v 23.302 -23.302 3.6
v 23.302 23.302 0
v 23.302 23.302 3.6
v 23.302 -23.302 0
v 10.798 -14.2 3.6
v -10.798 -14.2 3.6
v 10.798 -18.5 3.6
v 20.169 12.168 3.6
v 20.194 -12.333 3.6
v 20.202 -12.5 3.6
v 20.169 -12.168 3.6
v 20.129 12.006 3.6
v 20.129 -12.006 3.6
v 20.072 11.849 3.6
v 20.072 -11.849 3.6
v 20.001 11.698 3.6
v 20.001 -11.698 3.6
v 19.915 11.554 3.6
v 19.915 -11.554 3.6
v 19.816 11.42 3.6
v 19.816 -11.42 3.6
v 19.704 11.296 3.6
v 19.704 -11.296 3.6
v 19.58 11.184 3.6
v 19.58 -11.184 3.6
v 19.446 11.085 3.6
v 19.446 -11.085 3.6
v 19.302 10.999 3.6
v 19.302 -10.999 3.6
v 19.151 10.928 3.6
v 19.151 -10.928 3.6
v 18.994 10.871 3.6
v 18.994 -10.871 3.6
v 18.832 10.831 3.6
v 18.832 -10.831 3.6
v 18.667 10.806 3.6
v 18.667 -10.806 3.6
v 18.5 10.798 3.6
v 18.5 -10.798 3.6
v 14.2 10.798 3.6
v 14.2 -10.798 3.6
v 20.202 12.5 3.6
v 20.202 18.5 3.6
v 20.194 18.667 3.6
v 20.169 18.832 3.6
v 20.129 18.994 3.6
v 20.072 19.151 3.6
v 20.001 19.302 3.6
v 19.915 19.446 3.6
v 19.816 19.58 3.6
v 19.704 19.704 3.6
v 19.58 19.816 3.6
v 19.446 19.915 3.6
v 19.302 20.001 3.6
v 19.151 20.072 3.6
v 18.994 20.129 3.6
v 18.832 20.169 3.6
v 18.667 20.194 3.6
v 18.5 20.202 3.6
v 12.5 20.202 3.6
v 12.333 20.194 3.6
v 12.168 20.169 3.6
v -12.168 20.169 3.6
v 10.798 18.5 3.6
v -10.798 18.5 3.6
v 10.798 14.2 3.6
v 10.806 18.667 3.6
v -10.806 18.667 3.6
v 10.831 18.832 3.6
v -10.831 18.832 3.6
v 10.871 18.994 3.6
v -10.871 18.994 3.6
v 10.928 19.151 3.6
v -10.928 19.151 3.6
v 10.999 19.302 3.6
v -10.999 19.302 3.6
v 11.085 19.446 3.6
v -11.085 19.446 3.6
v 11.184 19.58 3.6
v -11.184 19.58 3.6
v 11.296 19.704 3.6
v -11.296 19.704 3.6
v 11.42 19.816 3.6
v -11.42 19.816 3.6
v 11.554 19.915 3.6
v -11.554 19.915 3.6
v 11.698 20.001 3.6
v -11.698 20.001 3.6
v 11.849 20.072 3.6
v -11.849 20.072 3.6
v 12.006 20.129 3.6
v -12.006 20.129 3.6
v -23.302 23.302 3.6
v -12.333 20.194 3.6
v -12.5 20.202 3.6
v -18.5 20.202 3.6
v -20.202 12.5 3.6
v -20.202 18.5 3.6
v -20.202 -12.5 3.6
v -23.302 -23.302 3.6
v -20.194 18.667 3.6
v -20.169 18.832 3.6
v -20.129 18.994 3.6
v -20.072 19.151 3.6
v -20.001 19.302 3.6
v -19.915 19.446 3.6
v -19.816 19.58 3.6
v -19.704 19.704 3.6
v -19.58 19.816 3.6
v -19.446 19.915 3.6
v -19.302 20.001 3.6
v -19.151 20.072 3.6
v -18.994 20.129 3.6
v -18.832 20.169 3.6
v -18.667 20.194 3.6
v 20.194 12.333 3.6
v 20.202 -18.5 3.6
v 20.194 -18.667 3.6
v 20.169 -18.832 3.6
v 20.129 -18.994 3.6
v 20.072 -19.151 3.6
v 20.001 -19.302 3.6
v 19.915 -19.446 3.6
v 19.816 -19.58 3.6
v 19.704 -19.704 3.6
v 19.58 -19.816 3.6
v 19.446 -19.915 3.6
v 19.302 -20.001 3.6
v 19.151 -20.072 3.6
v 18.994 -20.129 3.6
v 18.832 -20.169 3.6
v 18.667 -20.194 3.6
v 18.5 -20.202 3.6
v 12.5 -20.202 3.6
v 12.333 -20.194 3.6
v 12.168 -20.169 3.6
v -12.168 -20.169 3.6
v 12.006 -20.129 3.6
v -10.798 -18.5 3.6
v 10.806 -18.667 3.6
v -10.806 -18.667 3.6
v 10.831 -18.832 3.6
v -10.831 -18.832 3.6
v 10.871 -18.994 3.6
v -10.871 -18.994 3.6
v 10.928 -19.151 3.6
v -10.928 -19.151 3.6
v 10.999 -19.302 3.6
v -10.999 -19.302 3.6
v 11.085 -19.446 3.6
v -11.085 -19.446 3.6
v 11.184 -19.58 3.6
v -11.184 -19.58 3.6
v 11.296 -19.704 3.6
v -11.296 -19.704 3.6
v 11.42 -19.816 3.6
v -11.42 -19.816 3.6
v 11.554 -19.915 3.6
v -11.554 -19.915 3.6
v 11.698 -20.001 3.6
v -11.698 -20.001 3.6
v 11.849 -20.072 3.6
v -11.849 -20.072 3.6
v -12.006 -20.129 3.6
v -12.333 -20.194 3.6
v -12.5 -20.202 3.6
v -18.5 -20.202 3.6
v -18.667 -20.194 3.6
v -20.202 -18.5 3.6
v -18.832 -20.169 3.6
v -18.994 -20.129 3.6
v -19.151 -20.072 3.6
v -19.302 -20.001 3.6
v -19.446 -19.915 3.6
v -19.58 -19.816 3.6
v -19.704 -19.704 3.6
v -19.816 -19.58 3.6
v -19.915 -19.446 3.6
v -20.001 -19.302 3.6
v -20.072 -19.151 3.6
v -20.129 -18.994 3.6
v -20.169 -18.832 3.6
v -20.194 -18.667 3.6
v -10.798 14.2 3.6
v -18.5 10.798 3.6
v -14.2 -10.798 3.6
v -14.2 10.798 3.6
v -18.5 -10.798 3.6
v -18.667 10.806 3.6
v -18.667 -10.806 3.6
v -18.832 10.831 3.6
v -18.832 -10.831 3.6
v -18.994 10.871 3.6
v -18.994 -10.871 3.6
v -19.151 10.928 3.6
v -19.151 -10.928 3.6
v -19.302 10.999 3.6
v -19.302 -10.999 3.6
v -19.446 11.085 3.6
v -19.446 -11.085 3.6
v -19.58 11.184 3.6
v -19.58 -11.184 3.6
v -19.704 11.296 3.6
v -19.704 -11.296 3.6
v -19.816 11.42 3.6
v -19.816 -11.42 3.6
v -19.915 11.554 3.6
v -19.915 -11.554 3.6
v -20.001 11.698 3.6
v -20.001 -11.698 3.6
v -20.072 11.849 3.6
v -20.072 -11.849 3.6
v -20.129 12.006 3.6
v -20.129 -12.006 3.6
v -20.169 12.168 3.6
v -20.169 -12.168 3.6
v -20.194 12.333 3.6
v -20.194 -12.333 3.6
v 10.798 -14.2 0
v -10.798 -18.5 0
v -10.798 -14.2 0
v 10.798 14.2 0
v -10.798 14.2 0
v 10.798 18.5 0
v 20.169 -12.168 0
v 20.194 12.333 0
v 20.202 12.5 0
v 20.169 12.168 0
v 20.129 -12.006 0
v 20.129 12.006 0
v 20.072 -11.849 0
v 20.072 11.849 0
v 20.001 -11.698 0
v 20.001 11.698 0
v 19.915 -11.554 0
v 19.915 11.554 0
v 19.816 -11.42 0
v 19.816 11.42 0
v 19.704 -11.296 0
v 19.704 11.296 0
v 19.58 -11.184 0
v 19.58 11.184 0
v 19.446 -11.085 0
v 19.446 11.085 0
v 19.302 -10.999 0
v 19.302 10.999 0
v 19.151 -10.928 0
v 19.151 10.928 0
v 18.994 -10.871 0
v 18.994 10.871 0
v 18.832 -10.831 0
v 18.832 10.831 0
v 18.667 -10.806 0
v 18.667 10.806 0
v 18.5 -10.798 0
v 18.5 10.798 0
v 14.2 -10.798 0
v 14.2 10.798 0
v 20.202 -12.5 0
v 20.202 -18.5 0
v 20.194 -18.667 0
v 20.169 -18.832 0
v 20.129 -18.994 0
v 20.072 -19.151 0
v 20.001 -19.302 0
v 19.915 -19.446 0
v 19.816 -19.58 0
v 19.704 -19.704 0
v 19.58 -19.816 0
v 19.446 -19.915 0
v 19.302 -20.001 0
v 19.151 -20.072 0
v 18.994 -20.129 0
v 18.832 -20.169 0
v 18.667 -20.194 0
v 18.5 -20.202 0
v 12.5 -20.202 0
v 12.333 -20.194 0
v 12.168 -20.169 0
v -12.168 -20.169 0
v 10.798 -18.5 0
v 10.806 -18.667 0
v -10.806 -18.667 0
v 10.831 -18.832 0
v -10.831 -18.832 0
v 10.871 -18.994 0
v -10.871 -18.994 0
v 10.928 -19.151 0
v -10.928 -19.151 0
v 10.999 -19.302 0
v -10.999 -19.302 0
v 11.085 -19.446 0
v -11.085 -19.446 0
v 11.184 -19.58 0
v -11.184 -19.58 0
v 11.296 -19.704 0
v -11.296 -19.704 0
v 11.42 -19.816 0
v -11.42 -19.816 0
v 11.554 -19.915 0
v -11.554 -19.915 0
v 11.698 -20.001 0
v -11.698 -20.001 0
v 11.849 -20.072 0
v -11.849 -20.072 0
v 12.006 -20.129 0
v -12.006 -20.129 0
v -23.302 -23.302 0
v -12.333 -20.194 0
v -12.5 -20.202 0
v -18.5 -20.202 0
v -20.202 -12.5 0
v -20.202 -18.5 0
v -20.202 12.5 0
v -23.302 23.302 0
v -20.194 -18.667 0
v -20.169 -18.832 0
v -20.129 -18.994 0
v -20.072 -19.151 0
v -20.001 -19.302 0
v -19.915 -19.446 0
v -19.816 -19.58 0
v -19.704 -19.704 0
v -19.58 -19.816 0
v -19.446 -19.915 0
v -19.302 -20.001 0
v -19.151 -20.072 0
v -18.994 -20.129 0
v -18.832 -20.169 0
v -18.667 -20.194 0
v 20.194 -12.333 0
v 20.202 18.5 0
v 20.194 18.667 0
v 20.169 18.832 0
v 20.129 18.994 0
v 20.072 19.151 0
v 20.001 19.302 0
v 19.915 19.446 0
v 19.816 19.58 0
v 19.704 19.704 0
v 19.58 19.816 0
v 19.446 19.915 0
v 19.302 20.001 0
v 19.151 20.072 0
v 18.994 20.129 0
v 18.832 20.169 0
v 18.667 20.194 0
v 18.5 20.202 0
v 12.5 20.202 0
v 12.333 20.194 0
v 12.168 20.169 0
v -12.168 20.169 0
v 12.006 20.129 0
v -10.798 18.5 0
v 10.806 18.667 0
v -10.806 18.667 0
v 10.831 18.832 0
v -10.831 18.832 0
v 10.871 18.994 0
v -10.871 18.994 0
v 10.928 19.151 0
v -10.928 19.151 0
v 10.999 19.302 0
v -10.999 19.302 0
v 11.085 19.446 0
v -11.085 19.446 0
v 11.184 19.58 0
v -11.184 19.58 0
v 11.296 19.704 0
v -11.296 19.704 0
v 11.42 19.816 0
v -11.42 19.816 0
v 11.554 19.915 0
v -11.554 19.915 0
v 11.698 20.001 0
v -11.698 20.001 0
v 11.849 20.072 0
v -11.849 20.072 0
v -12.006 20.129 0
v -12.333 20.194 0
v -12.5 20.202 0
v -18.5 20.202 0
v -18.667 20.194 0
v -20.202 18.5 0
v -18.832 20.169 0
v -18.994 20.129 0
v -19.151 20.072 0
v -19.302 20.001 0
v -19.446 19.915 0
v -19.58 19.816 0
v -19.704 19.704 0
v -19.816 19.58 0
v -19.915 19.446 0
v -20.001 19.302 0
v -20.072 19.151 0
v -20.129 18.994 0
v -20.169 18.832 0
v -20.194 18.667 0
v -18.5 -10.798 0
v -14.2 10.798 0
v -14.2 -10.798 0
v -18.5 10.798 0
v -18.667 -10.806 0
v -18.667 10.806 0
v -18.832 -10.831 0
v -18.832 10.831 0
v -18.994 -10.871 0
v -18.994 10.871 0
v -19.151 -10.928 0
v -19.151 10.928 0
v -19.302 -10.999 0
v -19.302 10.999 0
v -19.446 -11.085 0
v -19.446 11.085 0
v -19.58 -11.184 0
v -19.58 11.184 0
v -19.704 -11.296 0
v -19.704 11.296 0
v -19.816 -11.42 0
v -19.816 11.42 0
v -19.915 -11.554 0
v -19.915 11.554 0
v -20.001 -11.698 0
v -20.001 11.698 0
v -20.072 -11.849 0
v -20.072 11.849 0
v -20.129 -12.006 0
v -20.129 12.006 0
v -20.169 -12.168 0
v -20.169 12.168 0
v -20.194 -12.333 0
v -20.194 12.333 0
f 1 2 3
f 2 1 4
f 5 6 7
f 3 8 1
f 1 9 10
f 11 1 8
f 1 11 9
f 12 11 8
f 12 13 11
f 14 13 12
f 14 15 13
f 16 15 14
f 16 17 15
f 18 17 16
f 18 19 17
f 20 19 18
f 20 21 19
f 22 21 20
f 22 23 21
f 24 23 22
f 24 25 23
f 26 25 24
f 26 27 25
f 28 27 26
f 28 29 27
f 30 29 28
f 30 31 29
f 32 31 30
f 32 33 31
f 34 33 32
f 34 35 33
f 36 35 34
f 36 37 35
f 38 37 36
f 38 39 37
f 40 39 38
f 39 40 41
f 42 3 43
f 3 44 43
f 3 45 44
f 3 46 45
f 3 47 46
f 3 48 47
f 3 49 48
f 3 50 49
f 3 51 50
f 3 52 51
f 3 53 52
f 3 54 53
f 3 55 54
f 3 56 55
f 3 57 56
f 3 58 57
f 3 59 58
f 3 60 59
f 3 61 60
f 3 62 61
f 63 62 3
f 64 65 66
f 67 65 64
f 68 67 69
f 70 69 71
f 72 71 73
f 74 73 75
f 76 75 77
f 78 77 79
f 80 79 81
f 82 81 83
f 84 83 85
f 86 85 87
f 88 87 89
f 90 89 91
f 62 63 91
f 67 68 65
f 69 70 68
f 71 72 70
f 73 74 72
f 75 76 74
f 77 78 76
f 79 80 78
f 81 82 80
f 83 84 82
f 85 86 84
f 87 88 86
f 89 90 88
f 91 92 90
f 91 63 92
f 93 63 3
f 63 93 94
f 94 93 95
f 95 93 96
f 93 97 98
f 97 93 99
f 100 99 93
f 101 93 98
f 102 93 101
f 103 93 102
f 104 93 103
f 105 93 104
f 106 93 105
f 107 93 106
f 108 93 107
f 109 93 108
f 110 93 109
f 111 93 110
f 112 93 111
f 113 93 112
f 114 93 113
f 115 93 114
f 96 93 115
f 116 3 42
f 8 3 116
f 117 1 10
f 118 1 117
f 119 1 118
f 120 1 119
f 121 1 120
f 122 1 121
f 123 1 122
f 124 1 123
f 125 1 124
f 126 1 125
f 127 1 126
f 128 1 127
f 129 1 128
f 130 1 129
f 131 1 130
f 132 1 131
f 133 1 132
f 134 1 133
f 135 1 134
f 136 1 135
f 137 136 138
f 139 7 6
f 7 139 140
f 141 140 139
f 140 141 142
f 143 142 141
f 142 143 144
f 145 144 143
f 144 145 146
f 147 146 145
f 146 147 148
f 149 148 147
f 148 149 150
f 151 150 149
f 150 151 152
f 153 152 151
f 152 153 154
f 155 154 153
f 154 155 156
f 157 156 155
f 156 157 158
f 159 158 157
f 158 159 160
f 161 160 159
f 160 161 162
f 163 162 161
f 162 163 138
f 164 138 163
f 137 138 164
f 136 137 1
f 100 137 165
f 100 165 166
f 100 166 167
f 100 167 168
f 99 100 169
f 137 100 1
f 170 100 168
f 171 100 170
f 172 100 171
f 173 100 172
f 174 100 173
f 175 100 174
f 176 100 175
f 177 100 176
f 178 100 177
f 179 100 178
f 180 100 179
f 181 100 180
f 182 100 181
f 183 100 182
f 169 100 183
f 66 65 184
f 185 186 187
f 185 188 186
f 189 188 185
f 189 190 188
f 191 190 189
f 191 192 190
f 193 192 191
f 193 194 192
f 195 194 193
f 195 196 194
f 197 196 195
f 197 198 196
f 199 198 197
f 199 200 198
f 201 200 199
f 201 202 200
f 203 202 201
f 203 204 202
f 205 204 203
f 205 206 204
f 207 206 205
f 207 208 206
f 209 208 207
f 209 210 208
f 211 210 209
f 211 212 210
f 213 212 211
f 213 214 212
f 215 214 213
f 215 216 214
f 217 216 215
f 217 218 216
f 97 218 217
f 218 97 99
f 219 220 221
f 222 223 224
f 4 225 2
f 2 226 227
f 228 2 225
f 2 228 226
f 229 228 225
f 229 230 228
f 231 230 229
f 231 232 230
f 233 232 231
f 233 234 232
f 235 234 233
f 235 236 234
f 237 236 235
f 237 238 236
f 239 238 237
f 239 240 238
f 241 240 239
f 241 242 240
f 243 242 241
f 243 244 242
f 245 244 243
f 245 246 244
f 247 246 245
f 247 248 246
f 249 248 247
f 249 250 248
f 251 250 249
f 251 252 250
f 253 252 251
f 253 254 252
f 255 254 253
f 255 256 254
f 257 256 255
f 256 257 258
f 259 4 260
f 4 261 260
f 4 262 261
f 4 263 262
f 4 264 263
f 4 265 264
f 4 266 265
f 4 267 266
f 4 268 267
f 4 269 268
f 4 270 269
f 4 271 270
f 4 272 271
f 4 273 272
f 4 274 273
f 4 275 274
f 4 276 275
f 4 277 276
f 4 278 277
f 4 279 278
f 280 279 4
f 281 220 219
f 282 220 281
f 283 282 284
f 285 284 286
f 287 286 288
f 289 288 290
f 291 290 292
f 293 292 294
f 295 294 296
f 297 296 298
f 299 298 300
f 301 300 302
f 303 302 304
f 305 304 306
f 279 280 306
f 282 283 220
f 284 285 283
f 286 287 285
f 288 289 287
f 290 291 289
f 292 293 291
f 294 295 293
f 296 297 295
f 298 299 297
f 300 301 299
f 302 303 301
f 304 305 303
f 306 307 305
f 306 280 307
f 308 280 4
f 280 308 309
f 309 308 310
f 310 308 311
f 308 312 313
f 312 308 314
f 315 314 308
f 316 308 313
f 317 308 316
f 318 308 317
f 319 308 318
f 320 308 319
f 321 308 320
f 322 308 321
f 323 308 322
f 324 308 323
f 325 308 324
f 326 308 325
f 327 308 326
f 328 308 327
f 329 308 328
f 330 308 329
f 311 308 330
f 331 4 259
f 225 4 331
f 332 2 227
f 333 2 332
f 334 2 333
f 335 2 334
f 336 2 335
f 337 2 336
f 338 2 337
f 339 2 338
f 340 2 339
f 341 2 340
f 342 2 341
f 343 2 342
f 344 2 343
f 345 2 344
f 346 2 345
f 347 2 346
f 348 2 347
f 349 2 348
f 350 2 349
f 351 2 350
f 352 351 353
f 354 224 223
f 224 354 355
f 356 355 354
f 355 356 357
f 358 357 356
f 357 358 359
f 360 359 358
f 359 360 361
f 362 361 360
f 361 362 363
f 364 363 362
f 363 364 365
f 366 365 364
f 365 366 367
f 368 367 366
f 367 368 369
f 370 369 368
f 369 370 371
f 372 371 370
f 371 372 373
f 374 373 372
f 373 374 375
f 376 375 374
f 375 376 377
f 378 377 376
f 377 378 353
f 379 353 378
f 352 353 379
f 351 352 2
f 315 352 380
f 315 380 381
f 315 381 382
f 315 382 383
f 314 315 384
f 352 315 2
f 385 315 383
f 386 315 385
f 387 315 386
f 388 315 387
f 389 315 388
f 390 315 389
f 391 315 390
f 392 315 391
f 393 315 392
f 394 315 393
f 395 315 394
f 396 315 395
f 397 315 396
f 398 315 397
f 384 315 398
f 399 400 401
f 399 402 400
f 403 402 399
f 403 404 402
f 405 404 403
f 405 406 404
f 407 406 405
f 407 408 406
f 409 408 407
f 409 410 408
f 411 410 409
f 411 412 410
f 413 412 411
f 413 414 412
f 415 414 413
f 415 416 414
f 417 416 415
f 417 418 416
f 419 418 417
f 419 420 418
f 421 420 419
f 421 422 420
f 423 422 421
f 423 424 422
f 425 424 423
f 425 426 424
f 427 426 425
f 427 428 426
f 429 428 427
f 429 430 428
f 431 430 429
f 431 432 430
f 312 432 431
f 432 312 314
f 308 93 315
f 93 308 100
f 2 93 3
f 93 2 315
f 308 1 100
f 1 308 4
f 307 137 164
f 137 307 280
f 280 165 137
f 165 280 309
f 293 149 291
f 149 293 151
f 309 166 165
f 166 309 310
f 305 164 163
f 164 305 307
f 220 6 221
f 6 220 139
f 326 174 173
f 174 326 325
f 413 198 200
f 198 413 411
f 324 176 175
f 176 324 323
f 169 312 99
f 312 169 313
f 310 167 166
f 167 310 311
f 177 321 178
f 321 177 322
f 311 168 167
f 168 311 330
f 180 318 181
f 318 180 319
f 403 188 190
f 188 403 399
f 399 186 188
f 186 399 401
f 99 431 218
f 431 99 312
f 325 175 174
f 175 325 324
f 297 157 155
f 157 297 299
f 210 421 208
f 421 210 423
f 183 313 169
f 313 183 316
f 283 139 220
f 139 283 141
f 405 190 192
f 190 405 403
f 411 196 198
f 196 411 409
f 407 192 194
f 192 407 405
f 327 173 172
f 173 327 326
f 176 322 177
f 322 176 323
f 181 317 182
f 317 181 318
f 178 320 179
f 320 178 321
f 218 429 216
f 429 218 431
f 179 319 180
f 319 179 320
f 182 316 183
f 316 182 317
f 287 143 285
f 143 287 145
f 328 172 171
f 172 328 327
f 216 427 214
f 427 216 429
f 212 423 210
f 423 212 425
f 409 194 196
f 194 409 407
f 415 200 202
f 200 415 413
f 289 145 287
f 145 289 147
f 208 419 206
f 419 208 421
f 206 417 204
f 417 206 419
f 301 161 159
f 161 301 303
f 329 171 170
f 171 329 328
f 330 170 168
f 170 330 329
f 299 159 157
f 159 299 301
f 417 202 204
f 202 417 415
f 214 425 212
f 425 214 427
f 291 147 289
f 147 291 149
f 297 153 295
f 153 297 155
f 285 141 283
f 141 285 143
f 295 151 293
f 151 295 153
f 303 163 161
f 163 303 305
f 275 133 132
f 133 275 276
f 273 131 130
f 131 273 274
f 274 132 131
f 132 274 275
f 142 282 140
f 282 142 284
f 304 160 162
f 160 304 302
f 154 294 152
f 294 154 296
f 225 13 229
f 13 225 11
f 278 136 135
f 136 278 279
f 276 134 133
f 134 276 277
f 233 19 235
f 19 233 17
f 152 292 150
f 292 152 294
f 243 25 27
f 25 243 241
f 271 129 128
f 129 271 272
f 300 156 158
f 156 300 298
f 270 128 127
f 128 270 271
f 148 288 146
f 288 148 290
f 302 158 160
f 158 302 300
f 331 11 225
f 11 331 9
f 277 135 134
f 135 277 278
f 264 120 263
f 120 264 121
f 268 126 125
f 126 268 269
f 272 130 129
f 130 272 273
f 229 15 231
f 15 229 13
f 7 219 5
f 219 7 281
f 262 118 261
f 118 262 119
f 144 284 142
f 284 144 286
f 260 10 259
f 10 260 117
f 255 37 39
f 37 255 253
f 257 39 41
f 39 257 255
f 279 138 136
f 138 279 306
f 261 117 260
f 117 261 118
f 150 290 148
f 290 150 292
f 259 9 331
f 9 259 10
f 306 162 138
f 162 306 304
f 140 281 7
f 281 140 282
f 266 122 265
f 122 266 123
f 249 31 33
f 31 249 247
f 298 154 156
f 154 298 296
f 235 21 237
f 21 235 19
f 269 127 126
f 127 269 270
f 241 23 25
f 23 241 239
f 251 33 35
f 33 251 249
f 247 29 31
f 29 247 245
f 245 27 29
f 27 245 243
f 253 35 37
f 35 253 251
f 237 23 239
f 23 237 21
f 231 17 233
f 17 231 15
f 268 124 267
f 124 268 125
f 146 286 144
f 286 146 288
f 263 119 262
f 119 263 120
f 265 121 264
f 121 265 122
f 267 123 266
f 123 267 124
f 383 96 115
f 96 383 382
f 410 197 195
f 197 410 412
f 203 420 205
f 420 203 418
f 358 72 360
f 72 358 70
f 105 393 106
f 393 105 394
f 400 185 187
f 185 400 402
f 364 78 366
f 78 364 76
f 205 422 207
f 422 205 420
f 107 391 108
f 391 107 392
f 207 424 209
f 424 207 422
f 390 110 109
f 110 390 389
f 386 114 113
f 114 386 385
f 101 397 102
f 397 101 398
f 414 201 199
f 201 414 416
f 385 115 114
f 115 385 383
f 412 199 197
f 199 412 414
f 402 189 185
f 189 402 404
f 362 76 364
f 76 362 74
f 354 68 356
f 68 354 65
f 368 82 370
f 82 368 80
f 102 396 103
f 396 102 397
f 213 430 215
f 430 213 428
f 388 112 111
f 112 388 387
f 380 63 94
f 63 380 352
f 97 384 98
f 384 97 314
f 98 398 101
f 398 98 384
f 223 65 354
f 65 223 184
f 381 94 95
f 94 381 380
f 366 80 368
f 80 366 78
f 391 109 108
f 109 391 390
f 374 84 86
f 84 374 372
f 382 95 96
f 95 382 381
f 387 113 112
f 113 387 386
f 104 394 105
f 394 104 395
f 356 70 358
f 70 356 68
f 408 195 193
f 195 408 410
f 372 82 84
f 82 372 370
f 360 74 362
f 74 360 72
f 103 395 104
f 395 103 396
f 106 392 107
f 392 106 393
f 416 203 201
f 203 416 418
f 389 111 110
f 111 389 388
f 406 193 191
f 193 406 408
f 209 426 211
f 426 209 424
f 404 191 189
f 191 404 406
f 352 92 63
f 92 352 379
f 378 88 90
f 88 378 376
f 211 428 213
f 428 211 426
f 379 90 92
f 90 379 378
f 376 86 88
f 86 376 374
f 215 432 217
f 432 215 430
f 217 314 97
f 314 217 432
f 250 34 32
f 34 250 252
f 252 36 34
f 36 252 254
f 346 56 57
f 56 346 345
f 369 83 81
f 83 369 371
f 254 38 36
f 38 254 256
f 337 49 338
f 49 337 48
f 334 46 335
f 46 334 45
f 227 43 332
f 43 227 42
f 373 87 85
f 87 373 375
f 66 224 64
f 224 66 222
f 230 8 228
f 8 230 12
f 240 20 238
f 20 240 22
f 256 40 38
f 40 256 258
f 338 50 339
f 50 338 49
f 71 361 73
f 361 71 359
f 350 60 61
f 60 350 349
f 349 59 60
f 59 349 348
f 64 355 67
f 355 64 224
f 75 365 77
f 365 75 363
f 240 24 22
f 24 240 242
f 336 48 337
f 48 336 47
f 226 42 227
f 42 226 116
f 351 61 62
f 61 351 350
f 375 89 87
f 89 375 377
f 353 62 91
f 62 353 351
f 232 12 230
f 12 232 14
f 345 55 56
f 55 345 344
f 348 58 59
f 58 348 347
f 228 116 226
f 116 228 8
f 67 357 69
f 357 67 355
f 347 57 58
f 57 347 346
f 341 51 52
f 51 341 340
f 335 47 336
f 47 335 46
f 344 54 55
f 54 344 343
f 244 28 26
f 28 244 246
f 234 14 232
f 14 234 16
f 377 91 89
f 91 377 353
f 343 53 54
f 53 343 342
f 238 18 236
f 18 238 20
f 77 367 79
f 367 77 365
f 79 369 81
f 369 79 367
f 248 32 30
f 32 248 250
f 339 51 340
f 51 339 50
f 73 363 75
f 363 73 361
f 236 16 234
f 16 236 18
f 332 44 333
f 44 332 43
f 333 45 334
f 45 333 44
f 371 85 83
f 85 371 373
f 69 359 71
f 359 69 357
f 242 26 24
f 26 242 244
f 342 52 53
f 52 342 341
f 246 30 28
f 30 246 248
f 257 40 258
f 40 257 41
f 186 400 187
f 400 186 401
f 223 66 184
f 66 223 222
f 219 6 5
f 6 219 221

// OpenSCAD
// render file: printed bodies, closed pose
// body plate
difference() {
  color("#4f81bd") union() {
    // body plate (plate)
    multmatrix([[1, 0, 0, 0], [0, 1, 0, 0], [0, 0, 1, 0], [0, 0, 0, 1]]) translate([-23.30205, -23.30205, 0]) cube([46.6041, 46.6041, 3.6]);
  }
  // cut slot_0 (bolt_slot)
  multmatrix([[1, 0, 0, -15.5], [0, 1, 0, -15.5], [0, 0, 1, -1], [0, 0, 0, 1]]) linear_extrude(height=5.6) polygon(points=[[3, -4.70205], [3.16683, -4.693854], [3.332054, -4.669346], [3.494079, -4.62876], [3.651346, -4.572489], [3.802341, -4.501074], [3.945608, -4.415203], [4.079769, -4.315703], [4.203531, -4.203531], [4.315703, -4.079769], [4.415203, -3.945608], [4.501074, -3.802341], [4.572489, -3.651346], [4.62876, -3.494079], [4.669346, -3.332054], [4.693854, -3.16683], [4.70205, -3], [4.70205, 3], [4.693854, 3.16683], [4.669346, 3.332054], [4.62876, 3.494079], [4.572489, 3.651346], [4.501074, 3.802341], [4.415203, 3.945608], [4.315703, 4.079769], [4.203531, 4.203531], [4.079769, 4.315703], [3.945608, 4.415203], [3.802341, 4.501074], [3.651346, 4.572489], [3.494079, 4.62876], [3.332054, 4.669346], [3.16683, 4.693854], [3, 4.70205], [-3, 4.70205], [-3.16683, 4.693854], [-3.332054, 4.669346], [-3.494079, 4.62876], [-3.651346, 4.572489], [-3.802341, 4.501074], [-3.945608, 4.415203], [-4.079769, 4.315703], [-4.203531, 4.203531], [-4.315703, 4.079769], [-4.415203, 3.945608], [-4.501074, 3.802341], [-4.572489, 3.651346], [-4.62876, 3.494079], [-4.669346, 3.332054], [-4.693854, 3.16683], [-4.70205, 3], [-4.70205, -3], [-4.693854, -3.16683], [-4.669346, -3.332054], [-4.62876, -3.494079], [-4.572489, -3.651346], [-4.501074, -3.802341], [-4.415203, -3.945608], [-4.315703, -4.079769], [-4.203531, -4.203531], [-4.079769, -4.315703], [-3.945608, -4.415203], [-3.802341, -4.501074], [-3.651346, -4.572489], [-3.494079, -4.62876], [-3.332054, -4.669346], [-3.16683, -4.693854], [-3, -4.70205]]);
  // cut slot_1 (bolt_slot)
  multmatrix([[1, 0, 0, 15.5], [0, 1, 0, -15.5], [0, 0, 1, -1], [0, 0, 0, 1]]) linear_extrude(height=5.6) polygon(points=[[3, -4.70205], [3.16683, -4.693854], [3.332054, -4.669346], [3.494079, -4.62876], [3.651346, -4.572489], [3.802341, -4.501074], [3.945608, -4.415203], [4.079769, -4.315703], [4.203531, -4.203531], [4.315703, -4.079769], [4.415203, -3.945608], [4.501074, -3.802341], [4.572489, -3.651346], [4.62876, -3.494079], [4.669346, -3.332054], [4.693854, -3.16683], [4.70205, -3], [4.70205, 3], [4.693854, 3.16683], [4.669346, 3.332054], [4.62876, 3.494079], [4.572489, 3.651346], [4.501074, 3.802341], [4.415203, 3.945608], [4.315703, 4.079769], [4.203531, 4.203531], [4.079769, 4.315703], [3.945608, 4.415203], [3.802341, 4.501074], [3.651346, 4.572489], [3.494079, 4.62876], [3.332054, 4.669346], [3.16683, 4.693854], [3, 4.70205], [-3, 4.70205], [-3.16683, 4.693854], [-3.332054, 4.669346], [-3.494079, 4.62876], [-3.651346, 4.572489], [-3.802341, 4.501074], [-3.945608, 4.415203], [-4.079769, 4.315703], [-4.203531, 4.203531], [-4.315703, 4.079769], [-4.415203, 3.945608], [-4.501074, 3.802341], [-4.572489, 3.651346], [-4.62876, 3.494079], [-4.669346, 3.332054], [-4.693854, 3.16683], [-4.70205, 3], [-4.70205, -3], [-4.693854, -3.16683], [-4.669346, -3.332054], [-4.62876, -3.494079], [-4.572489, -3.651346], [-4.501074, -3.802341], [-4.415203, -3.945608], [-4.315703, -4.079769], [-4.203531, -4.203531], [-4.079769, -4.315703], [-3.945608, -4.415203], [-3.802341, -4.501074], [-3.651346, -4.572489], [-3.494079, -4.62876], [-3.332054, -4.669346], [-3.16683, -4.693854], [-3, -4.70205]]);
  // cut slot_2 (bolt_slot)
  multmatrix([[1, 0, 0, -15.5], [0, 1, 0, 15.5], [0, 0, 1, -1], [0, 0, 0, 1]]) linear_extrude(height=5.6) polygon(points=[[3, -4.70205], [3.16683, -4.693854], [3.332054, -4.669346], [3.494079, -4.62876], [3.651346, -4.572489], [3.802341, -4.501074], [3.945608, -4.415203], [4.079769, -4.315703], [4.203531, -4.203531], [4.315703, -4.079769], [4.415203, -3.945608], [4.501074, -3.802341], [4.572489, -3.651346], [4.62876, -3.494079], [4.669346, -3.332054], [4.693854, -3.16683], [4.70205, -3], [4.70205, 3], [4.693854, 3.16683], [4.669346, 3.332054], [4.62876, 3.494079], [4.572489, 3.651346], [4.501074, 3.802341], [4.415203, 3.945608], [4.315703, 4.079769], [4.203531, 4.203531], [4.079769, 4.315703], [3.945608, 4.415203], [3.802341, 4.501074], [3.651346, 4.572489], [3.494079, 4.62876], [3.332054, 4.669346], [3.16683, 4.693854], [3, 4.70205], [-3, 4.70205], [-3.16683, 4.693854], [-3.332054, 4.669346], [-3.494079, 4.62876], [-3.651346, 4.572489], [-3.802341, 4.501074], [-3.945608, 4.415203], [-4.079769, 4.315703], [-4.203531, 4.203531], [-4.315703, 4.079769], [-4.415203, 3.945608], [-4.501074, 3.802341], [-4.572489, 3.651346], [-4.62876, 3.494079], [-4.669346, 3.332054], [-4.693854, 3.16683], [-4.70205, 3], [-4.70205, -3], [-4.693854, -3.16683], [-4.669346, -3.332054], [-4.62876, -3.494079], [-4.572489, -3.651346], [-4.501074, -3.802341], [-4.415203, -3.945608], [-4.315703, -4.079769], [-4.203531, -4.203531], [-4.079769, -4.315703], [-3.945608, -4.415203], [-3.802341, -4.501074], [-3.651346, -4.572489], [-3.494079, -4.62876], [-3.332054, -4.669346], [-3.16683, -4.693854], [-3, -4.70205]]);
  // cut slot_3 (bolt_slot)
  multmatrix([[1, 0, 0, 15.5], [0, 1, 0, 15.5], [0, 0, 1, -1], [0, 0, 0, 1]]) linear_extrude(height=5.6) polygon(points=[[3, -4.70205], [3.16683, -4.693854], [3.332054, -4.669346], [3.494079, -4.62876], [3.651346, -4.572489], [3.802341, -4.501074], [3.945608, -4.415203], [4.079769, -4.315703], [4.203531, -4.203531], [4.315703, -4.079769], [4.415203, -3.945608], [4.501074, -3.802341], [4.572489, -3.651346], [4.62876, -3.494079], [4.669346, -3.332054], [4.693854, -3.16683], [4.70205, -3], [4.70205, 3], [4.693854, 3.16683], [4.669346, 3.332054], [4.62876, 3.494079], [4.572489, 3.651346], [4.501074, 3.802341], [4.415203, 3.945608], [4.315703, 4.079769], [4.203531, 4.203531], [4.079769, 4.315703], [3.945608, 4.415203], [3.802341, 4.501074], [3.651346, 4.572489], [3.494079, 4.62876], [3.332054, 4.669346], [3.16683, 4.693854], [3, 4.70205], [-3, 4.70205], [-3.16683, 4.693854], [-3.332054, 4.669346], [-3.494079, 4.62876], [-3.651346, 4.572489], [-3.802341, 4.501074], [-3.945608, 4.415203], [-4.079769, 4.315703], [-4.203531, 4.203531], [-4.315703, 4.079769], [-4.415203, 3.945608], [-4.501074, 3.802341], [-4.572489, 3.651346], [-4.62876, 3.494079], [-4.669346, 3.332054], [-4.693854, 3.16683], [-4.70205, 3], [-4.70205, -3], [-4.693854, -3.16683], [-4.669346, -3.332054], [-4.62876, -3.494079], [-4.572489, -3.651346], [-4.501074, -3.802341], [-4.415203, -3.945608], [-4.315703, -4.079769], [-4.203531, -4.203531], [-4.079769, -4.315703], [-3.945608, -4.415203], [-3.802341, -4.501074], [-3.651346, -4.572489], [-3.494079, -4.62876], [-3.332054, -4.669346], [-3.16683, -4.693854], [-3, -4.70205]]);
  // cut clear_pilot (recess)
  multmatrix([[1, 0, 0, 0], [0, 1, 0, 0], [0, 0, 1, -1], [0, 0, 0, 1]]) translate([-14.2, -14.2, 0]) cube([28.4, 28.4, 5.6]);
  // cut clear_shaft (recess)
  multmatrix([[1, 0, 0, 0], [0, 1, 0, 0], [0, 0, 1, -1], [0, 0, 0, 1]]) translate([-5.7, -5.7, 0]) cube([11.4, 11.4, 5.6]);
}
